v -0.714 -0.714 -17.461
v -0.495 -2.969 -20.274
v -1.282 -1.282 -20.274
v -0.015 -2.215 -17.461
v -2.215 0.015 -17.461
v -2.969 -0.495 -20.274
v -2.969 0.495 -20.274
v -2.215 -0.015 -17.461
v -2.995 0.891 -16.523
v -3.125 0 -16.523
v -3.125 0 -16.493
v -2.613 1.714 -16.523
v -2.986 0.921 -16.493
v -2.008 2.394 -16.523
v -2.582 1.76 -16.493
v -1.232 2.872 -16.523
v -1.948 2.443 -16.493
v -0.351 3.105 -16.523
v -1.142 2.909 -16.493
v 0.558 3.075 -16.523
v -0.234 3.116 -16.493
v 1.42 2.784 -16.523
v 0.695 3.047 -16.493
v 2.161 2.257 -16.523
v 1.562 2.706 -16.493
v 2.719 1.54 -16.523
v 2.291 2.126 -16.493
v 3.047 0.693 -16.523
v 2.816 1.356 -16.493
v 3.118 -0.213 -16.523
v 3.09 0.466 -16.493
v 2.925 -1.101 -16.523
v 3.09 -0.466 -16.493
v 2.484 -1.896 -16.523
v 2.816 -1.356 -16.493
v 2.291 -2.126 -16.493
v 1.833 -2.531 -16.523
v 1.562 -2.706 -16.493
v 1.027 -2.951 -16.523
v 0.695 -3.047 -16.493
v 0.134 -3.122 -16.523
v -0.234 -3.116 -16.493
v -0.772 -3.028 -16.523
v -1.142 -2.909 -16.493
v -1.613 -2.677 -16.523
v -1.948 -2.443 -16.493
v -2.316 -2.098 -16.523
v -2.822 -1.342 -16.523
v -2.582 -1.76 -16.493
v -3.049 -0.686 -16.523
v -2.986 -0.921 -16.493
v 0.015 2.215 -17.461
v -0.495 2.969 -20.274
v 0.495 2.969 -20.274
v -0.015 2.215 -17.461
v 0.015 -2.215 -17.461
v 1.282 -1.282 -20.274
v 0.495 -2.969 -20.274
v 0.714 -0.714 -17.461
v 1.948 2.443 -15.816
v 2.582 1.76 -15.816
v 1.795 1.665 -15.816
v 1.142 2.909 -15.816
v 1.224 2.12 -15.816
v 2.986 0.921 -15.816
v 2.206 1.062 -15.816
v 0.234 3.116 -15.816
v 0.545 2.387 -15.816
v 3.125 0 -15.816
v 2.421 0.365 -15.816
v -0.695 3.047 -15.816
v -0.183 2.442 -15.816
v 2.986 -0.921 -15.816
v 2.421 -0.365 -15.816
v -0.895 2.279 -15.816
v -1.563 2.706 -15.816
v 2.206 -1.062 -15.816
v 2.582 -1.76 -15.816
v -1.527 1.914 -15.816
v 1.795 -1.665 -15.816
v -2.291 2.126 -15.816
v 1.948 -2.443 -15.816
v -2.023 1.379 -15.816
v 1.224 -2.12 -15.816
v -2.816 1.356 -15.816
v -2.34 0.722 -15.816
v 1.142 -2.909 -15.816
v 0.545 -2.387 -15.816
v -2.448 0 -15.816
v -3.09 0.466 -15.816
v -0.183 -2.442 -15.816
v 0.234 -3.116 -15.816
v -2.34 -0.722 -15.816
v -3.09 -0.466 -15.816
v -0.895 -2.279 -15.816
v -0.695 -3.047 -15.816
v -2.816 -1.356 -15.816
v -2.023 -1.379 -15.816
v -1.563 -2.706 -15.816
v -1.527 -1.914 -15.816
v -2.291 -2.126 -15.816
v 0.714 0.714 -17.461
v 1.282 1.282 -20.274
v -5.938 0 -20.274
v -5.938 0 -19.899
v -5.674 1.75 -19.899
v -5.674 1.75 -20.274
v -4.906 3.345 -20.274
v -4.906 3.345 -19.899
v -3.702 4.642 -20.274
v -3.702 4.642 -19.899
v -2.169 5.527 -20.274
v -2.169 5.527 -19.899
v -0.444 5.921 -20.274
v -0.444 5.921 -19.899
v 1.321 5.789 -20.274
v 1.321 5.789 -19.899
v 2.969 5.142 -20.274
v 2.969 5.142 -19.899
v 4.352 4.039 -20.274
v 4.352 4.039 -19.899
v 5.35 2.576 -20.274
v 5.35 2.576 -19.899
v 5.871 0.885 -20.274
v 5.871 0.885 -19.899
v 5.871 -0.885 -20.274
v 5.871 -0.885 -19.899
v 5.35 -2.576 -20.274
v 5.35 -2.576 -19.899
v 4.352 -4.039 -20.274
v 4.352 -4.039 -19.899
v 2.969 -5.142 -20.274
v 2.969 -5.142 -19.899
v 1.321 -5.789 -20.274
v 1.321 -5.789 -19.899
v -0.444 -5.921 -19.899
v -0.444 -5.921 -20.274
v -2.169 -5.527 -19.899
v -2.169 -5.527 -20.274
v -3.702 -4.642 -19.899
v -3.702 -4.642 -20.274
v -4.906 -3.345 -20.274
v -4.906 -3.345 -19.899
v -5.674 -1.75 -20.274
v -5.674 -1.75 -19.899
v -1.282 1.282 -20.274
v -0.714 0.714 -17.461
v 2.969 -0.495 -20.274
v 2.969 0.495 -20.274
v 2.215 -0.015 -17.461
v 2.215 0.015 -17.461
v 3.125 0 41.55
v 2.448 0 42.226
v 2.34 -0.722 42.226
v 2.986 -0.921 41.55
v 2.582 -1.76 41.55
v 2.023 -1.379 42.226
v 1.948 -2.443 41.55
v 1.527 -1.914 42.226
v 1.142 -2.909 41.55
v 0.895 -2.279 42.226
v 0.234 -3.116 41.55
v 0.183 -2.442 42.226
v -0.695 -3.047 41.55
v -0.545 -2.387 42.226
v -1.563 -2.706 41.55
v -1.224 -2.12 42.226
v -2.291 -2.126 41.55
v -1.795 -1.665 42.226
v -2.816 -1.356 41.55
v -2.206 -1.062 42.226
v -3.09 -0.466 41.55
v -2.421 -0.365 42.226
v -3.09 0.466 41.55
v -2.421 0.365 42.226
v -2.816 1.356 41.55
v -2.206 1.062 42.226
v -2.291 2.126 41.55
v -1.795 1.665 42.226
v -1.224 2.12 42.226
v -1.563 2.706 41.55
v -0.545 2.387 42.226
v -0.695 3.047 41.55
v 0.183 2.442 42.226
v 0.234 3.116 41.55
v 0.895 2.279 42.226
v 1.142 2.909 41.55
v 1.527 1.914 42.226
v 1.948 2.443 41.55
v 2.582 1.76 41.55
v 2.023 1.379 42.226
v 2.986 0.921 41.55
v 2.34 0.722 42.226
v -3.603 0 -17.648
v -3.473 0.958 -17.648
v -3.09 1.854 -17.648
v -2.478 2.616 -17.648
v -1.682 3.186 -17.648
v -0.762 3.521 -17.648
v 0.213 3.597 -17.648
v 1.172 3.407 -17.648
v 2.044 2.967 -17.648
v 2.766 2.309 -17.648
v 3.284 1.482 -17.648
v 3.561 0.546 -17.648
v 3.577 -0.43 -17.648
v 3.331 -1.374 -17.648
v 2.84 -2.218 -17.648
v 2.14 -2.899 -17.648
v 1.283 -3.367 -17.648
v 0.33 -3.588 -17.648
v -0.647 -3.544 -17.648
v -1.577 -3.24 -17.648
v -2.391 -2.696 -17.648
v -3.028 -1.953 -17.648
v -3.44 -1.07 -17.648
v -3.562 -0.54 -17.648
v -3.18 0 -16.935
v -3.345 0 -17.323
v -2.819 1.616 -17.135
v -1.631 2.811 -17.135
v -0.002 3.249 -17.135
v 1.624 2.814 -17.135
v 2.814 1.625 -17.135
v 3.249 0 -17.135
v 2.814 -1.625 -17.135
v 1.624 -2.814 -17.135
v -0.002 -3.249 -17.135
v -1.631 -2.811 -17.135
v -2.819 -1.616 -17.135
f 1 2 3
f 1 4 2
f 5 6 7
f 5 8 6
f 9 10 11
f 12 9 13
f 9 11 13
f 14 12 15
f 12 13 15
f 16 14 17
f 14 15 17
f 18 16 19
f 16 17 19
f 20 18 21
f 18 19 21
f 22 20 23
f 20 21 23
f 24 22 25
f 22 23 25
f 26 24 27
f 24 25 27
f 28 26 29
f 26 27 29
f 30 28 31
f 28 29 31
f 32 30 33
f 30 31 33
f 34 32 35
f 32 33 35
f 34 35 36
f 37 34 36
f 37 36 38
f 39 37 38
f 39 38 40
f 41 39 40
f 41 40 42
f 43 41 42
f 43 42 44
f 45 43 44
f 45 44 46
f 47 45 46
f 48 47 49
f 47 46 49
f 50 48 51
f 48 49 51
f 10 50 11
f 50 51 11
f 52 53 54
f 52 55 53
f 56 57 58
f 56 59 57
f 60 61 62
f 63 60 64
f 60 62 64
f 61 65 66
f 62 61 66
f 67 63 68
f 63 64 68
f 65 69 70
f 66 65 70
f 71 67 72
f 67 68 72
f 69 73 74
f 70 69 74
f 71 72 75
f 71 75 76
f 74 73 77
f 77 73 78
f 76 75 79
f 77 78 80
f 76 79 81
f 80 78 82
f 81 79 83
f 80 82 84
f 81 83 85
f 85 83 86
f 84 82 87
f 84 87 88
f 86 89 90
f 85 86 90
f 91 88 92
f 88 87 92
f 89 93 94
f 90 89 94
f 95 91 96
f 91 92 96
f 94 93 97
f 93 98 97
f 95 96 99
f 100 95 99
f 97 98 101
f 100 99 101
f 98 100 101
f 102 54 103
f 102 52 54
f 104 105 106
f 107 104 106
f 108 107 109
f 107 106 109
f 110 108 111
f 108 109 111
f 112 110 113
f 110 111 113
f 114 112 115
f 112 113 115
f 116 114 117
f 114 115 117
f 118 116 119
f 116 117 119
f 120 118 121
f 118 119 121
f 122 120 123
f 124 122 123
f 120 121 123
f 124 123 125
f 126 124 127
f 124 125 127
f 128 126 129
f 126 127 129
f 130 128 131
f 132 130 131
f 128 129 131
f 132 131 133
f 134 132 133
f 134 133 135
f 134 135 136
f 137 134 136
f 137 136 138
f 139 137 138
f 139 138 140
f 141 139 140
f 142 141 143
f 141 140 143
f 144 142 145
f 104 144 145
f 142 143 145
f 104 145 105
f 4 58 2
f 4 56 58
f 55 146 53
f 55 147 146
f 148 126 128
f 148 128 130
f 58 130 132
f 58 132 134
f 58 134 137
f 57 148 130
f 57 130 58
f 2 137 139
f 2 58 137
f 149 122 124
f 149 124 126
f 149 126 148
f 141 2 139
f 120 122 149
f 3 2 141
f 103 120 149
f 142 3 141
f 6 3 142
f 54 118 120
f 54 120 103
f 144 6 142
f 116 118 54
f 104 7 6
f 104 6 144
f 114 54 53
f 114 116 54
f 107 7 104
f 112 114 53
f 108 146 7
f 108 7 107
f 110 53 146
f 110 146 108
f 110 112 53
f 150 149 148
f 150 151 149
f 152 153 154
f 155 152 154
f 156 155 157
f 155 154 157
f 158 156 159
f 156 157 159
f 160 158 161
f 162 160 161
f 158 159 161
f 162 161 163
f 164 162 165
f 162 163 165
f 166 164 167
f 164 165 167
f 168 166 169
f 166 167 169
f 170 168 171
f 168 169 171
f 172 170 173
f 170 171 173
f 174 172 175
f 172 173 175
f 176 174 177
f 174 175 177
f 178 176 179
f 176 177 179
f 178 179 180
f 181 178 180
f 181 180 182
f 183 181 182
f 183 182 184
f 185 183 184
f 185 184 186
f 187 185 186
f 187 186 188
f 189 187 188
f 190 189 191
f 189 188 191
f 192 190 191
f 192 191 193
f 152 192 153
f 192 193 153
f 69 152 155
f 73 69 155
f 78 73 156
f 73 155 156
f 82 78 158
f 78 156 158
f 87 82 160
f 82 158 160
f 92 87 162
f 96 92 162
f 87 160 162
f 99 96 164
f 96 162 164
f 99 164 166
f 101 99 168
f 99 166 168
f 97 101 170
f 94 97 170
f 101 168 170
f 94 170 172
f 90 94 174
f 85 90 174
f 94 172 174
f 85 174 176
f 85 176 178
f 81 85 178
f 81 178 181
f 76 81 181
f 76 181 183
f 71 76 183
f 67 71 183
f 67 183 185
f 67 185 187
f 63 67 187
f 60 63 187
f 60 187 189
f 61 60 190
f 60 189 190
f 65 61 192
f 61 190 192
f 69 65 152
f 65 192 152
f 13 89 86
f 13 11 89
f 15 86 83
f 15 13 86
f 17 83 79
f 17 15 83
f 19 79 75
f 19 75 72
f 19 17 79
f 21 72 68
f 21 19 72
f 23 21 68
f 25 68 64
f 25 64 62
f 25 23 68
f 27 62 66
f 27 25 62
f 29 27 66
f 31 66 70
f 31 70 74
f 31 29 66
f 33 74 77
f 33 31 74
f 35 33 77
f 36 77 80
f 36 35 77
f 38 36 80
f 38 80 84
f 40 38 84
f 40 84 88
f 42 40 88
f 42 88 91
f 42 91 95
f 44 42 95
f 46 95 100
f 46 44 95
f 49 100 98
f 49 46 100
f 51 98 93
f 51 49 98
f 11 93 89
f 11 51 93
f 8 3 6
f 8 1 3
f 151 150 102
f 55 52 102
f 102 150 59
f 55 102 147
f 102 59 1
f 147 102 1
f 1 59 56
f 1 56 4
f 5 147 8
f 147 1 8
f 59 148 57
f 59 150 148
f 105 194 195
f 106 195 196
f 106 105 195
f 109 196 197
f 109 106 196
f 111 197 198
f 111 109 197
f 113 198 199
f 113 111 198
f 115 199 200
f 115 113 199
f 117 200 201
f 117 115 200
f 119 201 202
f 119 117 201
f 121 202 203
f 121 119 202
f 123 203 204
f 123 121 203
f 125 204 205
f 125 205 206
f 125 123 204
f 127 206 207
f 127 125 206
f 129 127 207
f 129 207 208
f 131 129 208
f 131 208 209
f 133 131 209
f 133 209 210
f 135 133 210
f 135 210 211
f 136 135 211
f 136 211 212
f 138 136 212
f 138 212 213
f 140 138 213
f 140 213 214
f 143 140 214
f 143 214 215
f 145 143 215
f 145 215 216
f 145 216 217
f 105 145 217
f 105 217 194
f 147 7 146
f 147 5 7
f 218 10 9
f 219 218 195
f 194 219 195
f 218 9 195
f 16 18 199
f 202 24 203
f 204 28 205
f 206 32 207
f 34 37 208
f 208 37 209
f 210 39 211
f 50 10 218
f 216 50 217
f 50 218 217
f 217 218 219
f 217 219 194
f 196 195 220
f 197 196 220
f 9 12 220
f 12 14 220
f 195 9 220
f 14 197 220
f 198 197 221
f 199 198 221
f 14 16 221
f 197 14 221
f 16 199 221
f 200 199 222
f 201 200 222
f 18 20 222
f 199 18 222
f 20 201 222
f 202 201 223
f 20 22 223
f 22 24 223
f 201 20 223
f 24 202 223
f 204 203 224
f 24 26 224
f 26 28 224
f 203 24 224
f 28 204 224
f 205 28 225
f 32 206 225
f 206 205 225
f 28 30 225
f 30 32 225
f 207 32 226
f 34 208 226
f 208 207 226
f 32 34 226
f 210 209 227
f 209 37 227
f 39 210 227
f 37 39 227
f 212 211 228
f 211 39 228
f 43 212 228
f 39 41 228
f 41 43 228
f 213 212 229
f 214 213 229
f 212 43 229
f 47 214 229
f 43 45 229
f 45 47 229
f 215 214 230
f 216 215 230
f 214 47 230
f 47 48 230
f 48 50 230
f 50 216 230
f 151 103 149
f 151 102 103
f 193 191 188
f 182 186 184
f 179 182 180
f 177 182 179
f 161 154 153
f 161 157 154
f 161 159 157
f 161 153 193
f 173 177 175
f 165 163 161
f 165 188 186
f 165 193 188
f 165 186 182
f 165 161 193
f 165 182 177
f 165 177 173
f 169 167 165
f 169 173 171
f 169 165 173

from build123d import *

# Parameters (mm, degrees)
SKETCH1_W           = 1
SKETCH1_H           = 18.5735
SKETCH2_R           = 0.7835
BOSS_EXTRUDE1_DEPTH = 0.2165
BOSS_EXTRUDE1_TAPER = -45
SKETCH3_R           = 1
BOSS_EXTRUDE2_DEPTH = 0.222374751
SKETCH4_R           = 1
BOSS_EXTRUDE3_DEPTH = 0.867625249
BOSS_EXTRUDE3_TAPER = -46.049277384
SKETCH5_R           = 1.9
BOSS_EXTRUDE4_DEPTH = 0.12
CUT_EXTRUDE1_DEPTH  = 0.9
CUT_EXTRUDE1_TAPER  = 15
CHAMFER1_SIZE       = 0.2165
FILLET1_R           = 0.5
SCALE1_SCALE        = 3.125


with BuildPart() as part:
    # Sketch1 → Revolve1 (revolve)
    with BuildSketch(Plane.XZ):
        with Locations((0.5, 10.71325)):
            Rectangle(SKETCH1_W, SKETCH1_H)
    revolve(axis=Axis((0, 0, 20), (0, 0, -1)))

    # Sketch2 → Boss-Extrude1 (add)
    with BuildSketch(Plane(origin=(0, 0, 1.4265), x_dir=(-1, 0, 0), z_dir=(0, 0, -1))):
        Circle(SKETCH2_R)
    extrude(amount=BOSS_EXTRUDE1_DEPTH, taper=BOSS_EXTRUDE1_TAPER)

    # Sketch3 → Boss-Extrude2 (add)
    with BuildSketch(Plane(origin=(0, 0, 1.21), x_dir=(-1, 0, 0), z_dir=(0, 0, -1))):
        Circle(SKETCH3_R)
    extrude(amount=BOSS_EXTRUDE2_DEPTH)

    # Sketch4 → Boss-Extrude3 (add)
    with BuildSketch(Plane(origin=(0, 0, 0.987625249), x_dir=(-1, 0, 0), z_dir=(0, 0, -1))):
        Circle(SKETCH4_R)
    extrude(amount=BOSS_EXTRUDE3_DEPTH, taper=BOSS_EXTRUDE3_TAPER)

    # Sketch5 → Boss-Extrude4 (add)
    with BuildSketch(Plane(origin=(0, 0, 0.12), x_dir=(-1, 0, 0), z_dir=(0, 0, -1))):
        Circle(SKETCH5_R)
    extrude(amount=BOSS_EXTRUDE4_DEPTH)

    # Sketch6 → Cut-Extrude1 (cut)
    with BuildSketch(Plane(origin=(0, 0, 0), x_dir=(-1, 0, 0), z_dir=(0, 0, -1))):
        Polygon((-0.95, -0.158333333), (-0.410095116, -0.410095116), (-0.158333333, -0.95), (0.158333333, -0.95), (0.410095116, -0.410095116), (0.95, -0.158333333), (0.95, 0.158333333), (0.410095116, 0.410095116), (0.158333333, 0.95), (-0.158333333, 0.95), (-0.410095116, 0.410095116), (-0.95, 0.158333333), align=None)
    extrude(amount=-CUT_EXTRUDE1_DEPTH, taper=CUT_EXTRUDE1_TAPER, mode=Mode.SUBTRACT)

    # Chamfer1
    chamfer1_edges = [part.edges().sort_by_distance(p)[0] for p in [
        (-1, 0, 20),
    ]]
    chamfer(chamfer1_edges, length=CHAMFER1_SIZE)

    # Fillet1
    fillet1_edges = [part.edges().sort_by_distance(p)[0] for p in [
        (1, 0, 0.987625249),
    ]]
    fillet(fillet1_edges, radius=FILLET1_R)


with BuildPart() as part_1:
    # Scale1: scaled about (8e-09, 0, 9.540596362)
    add(part.part.scale(SCALE1_SCALE).moved(Location((-1.7e-08, 0, -20.273767269))))


solid = part_1.part
